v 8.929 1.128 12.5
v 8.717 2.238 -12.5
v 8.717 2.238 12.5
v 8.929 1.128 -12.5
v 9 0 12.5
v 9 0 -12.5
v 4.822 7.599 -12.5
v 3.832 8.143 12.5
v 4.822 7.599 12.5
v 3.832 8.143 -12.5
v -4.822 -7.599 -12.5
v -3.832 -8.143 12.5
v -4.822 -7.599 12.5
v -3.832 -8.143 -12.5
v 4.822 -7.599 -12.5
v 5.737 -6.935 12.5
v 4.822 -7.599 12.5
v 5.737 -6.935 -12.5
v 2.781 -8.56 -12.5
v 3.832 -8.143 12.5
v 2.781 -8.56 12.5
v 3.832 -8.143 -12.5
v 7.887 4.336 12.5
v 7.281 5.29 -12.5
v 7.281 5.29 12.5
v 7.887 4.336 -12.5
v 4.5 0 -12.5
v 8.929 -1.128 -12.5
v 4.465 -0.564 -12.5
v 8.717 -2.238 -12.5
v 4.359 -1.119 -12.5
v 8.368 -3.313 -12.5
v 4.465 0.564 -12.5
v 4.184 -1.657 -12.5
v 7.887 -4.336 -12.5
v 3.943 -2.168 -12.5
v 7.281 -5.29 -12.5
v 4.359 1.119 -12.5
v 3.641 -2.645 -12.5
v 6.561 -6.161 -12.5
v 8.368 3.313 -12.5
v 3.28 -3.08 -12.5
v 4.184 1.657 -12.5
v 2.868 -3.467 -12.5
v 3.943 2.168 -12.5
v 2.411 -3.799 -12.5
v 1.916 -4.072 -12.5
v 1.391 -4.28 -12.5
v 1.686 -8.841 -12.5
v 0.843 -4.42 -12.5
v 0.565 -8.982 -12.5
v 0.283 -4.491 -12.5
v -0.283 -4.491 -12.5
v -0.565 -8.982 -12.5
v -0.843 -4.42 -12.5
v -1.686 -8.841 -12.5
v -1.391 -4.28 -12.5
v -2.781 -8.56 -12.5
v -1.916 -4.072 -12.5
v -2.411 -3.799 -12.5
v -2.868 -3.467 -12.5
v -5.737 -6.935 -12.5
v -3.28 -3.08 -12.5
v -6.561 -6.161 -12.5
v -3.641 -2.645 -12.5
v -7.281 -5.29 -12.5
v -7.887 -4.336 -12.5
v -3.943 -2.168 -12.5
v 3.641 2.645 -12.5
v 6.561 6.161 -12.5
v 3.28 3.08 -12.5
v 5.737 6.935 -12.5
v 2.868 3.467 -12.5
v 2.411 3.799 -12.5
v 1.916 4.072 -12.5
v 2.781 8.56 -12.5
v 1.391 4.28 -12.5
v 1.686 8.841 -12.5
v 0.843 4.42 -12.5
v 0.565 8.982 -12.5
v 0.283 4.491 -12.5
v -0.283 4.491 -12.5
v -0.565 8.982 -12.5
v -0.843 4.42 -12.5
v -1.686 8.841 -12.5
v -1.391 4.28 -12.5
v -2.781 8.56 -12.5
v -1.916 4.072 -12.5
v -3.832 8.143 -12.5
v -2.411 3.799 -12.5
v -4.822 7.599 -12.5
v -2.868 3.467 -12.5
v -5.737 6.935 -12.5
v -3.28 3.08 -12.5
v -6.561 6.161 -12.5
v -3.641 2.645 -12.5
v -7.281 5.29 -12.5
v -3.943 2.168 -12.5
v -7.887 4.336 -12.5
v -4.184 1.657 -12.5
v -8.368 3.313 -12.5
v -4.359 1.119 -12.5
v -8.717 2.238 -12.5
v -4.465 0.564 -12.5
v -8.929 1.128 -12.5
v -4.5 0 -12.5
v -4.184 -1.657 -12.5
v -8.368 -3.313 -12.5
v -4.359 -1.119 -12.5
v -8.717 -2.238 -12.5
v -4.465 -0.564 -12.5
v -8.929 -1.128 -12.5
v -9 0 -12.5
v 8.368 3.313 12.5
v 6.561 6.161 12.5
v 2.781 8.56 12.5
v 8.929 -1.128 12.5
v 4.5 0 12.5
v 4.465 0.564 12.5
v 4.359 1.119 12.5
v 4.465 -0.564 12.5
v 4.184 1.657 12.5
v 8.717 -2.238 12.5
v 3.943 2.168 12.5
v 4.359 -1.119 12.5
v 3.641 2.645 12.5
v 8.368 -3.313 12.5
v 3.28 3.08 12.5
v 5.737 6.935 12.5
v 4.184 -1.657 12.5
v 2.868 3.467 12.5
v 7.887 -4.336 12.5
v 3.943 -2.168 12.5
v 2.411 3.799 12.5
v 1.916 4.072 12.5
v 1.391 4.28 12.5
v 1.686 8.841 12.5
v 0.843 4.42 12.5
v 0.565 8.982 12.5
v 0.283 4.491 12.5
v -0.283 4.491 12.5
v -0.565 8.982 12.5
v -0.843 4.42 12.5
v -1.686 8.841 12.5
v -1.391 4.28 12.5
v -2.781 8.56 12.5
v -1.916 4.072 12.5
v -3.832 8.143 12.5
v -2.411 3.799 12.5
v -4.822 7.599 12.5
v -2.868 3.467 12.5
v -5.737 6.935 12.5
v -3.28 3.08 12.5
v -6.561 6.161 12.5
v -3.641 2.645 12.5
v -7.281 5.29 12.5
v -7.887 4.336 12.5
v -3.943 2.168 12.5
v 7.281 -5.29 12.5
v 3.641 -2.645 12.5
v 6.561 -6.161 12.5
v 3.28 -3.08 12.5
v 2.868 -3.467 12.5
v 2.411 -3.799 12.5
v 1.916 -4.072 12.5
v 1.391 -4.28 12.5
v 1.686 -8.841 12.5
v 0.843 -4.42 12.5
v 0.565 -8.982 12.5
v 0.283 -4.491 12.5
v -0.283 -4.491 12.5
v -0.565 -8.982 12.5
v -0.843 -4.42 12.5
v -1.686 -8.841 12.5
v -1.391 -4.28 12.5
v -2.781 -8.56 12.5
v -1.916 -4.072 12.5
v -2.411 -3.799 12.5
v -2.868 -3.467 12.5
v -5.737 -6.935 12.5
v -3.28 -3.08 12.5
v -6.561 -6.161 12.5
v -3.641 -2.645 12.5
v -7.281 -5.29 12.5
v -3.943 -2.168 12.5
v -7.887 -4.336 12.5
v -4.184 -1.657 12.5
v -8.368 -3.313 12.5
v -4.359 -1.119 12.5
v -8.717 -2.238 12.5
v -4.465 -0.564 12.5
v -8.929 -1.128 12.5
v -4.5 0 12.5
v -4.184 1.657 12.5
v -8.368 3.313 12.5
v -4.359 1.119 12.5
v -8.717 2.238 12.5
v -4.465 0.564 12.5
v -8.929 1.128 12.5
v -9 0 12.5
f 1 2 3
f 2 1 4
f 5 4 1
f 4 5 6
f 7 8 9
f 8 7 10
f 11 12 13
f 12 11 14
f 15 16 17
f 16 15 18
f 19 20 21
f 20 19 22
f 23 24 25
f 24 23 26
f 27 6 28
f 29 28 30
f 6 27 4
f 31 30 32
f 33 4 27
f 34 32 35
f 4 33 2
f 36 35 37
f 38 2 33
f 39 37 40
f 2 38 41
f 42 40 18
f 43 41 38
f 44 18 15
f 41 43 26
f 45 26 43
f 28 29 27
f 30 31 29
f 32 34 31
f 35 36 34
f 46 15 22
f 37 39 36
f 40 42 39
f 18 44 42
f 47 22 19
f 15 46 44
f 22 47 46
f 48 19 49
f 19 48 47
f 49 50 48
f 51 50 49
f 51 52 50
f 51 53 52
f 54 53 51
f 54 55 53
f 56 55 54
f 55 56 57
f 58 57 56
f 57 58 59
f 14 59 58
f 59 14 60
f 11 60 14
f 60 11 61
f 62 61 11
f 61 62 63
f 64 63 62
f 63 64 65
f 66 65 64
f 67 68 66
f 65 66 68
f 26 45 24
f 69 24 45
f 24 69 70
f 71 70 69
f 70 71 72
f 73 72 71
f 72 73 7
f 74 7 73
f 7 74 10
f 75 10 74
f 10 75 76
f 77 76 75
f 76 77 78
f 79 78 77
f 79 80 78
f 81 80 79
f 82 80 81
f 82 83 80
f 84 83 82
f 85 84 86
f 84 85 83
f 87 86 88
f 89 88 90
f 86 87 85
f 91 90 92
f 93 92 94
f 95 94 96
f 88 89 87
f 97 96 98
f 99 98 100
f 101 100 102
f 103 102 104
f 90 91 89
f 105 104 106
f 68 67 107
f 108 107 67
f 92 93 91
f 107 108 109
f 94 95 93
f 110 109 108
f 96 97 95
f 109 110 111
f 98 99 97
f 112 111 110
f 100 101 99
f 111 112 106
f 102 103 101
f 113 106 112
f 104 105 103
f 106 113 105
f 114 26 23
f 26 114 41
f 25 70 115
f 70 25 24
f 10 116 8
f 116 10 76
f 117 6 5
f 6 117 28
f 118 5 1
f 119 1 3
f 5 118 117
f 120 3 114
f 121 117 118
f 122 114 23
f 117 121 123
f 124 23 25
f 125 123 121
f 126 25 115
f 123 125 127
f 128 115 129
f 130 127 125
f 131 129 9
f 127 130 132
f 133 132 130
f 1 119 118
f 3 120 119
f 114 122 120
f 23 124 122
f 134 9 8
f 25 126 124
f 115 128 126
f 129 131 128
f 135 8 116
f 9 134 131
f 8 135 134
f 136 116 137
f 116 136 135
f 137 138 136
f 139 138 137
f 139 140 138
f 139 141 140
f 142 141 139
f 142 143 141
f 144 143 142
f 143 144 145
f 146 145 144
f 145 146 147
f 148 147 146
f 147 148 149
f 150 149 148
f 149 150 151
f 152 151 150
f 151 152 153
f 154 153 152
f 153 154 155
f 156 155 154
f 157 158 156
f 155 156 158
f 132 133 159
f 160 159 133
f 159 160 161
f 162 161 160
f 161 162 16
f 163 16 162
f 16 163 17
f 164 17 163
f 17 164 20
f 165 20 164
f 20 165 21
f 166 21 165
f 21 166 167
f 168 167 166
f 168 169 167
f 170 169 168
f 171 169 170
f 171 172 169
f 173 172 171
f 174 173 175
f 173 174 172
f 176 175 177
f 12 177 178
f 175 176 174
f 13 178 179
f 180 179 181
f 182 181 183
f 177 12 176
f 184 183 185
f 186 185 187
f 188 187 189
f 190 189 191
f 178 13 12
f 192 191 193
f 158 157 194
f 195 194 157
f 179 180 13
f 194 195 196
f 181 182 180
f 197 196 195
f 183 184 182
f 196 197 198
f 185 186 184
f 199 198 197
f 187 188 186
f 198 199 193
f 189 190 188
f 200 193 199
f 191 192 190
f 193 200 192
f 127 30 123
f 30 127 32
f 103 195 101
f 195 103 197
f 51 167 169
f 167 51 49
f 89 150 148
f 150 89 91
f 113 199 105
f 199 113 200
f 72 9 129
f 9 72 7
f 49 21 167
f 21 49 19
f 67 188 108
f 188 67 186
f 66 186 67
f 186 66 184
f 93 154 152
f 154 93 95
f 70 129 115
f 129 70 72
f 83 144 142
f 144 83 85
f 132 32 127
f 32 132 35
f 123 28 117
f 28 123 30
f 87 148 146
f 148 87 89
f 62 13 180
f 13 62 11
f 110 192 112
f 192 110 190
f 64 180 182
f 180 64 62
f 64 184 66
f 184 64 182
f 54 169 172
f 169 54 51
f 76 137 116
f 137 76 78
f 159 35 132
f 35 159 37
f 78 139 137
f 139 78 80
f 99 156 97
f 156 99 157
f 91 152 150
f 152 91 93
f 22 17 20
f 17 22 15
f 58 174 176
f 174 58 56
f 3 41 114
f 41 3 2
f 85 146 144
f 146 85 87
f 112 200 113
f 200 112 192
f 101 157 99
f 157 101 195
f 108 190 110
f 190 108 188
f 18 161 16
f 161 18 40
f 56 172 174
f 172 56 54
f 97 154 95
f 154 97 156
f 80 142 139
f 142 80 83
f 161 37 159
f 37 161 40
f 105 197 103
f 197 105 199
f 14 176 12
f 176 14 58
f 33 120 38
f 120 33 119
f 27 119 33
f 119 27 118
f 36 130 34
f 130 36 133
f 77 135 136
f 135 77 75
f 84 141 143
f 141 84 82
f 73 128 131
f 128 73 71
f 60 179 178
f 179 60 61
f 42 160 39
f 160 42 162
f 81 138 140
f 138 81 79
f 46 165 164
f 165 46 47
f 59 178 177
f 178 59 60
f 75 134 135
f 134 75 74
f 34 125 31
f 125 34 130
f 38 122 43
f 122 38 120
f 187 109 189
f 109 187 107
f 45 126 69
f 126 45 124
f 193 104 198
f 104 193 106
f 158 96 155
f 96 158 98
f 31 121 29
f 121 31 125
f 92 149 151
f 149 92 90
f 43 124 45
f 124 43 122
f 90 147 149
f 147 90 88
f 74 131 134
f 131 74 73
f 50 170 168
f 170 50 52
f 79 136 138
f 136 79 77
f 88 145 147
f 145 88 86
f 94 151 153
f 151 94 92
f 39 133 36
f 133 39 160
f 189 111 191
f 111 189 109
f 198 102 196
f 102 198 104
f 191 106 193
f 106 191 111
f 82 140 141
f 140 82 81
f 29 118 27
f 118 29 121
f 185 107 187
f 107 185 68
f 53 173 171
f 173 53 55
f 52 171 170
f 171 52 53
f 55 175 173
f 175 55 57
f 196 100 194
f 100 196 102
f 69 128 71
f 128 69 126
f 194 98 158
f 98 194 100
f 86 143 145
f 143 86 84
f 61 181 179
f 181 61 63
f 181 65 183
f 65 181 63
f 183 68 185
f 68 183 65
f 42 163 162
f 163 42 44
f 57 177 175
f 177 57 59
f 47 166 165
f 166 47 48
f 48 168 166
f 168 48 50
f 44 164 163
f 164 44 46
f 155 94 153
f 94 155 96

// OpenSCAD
$fn = 50;


difference() {
	union() {
		translate(v = [0, 0, -12.5000000000]) {
			cylinder(h = 25, r = 9.0000000000);
		}
	}
	union() {
		translate(v = [0, 0, -100.0000000000]) {
			cylinder(h = 200, r = 4.5000000000);
		}
	}
}
